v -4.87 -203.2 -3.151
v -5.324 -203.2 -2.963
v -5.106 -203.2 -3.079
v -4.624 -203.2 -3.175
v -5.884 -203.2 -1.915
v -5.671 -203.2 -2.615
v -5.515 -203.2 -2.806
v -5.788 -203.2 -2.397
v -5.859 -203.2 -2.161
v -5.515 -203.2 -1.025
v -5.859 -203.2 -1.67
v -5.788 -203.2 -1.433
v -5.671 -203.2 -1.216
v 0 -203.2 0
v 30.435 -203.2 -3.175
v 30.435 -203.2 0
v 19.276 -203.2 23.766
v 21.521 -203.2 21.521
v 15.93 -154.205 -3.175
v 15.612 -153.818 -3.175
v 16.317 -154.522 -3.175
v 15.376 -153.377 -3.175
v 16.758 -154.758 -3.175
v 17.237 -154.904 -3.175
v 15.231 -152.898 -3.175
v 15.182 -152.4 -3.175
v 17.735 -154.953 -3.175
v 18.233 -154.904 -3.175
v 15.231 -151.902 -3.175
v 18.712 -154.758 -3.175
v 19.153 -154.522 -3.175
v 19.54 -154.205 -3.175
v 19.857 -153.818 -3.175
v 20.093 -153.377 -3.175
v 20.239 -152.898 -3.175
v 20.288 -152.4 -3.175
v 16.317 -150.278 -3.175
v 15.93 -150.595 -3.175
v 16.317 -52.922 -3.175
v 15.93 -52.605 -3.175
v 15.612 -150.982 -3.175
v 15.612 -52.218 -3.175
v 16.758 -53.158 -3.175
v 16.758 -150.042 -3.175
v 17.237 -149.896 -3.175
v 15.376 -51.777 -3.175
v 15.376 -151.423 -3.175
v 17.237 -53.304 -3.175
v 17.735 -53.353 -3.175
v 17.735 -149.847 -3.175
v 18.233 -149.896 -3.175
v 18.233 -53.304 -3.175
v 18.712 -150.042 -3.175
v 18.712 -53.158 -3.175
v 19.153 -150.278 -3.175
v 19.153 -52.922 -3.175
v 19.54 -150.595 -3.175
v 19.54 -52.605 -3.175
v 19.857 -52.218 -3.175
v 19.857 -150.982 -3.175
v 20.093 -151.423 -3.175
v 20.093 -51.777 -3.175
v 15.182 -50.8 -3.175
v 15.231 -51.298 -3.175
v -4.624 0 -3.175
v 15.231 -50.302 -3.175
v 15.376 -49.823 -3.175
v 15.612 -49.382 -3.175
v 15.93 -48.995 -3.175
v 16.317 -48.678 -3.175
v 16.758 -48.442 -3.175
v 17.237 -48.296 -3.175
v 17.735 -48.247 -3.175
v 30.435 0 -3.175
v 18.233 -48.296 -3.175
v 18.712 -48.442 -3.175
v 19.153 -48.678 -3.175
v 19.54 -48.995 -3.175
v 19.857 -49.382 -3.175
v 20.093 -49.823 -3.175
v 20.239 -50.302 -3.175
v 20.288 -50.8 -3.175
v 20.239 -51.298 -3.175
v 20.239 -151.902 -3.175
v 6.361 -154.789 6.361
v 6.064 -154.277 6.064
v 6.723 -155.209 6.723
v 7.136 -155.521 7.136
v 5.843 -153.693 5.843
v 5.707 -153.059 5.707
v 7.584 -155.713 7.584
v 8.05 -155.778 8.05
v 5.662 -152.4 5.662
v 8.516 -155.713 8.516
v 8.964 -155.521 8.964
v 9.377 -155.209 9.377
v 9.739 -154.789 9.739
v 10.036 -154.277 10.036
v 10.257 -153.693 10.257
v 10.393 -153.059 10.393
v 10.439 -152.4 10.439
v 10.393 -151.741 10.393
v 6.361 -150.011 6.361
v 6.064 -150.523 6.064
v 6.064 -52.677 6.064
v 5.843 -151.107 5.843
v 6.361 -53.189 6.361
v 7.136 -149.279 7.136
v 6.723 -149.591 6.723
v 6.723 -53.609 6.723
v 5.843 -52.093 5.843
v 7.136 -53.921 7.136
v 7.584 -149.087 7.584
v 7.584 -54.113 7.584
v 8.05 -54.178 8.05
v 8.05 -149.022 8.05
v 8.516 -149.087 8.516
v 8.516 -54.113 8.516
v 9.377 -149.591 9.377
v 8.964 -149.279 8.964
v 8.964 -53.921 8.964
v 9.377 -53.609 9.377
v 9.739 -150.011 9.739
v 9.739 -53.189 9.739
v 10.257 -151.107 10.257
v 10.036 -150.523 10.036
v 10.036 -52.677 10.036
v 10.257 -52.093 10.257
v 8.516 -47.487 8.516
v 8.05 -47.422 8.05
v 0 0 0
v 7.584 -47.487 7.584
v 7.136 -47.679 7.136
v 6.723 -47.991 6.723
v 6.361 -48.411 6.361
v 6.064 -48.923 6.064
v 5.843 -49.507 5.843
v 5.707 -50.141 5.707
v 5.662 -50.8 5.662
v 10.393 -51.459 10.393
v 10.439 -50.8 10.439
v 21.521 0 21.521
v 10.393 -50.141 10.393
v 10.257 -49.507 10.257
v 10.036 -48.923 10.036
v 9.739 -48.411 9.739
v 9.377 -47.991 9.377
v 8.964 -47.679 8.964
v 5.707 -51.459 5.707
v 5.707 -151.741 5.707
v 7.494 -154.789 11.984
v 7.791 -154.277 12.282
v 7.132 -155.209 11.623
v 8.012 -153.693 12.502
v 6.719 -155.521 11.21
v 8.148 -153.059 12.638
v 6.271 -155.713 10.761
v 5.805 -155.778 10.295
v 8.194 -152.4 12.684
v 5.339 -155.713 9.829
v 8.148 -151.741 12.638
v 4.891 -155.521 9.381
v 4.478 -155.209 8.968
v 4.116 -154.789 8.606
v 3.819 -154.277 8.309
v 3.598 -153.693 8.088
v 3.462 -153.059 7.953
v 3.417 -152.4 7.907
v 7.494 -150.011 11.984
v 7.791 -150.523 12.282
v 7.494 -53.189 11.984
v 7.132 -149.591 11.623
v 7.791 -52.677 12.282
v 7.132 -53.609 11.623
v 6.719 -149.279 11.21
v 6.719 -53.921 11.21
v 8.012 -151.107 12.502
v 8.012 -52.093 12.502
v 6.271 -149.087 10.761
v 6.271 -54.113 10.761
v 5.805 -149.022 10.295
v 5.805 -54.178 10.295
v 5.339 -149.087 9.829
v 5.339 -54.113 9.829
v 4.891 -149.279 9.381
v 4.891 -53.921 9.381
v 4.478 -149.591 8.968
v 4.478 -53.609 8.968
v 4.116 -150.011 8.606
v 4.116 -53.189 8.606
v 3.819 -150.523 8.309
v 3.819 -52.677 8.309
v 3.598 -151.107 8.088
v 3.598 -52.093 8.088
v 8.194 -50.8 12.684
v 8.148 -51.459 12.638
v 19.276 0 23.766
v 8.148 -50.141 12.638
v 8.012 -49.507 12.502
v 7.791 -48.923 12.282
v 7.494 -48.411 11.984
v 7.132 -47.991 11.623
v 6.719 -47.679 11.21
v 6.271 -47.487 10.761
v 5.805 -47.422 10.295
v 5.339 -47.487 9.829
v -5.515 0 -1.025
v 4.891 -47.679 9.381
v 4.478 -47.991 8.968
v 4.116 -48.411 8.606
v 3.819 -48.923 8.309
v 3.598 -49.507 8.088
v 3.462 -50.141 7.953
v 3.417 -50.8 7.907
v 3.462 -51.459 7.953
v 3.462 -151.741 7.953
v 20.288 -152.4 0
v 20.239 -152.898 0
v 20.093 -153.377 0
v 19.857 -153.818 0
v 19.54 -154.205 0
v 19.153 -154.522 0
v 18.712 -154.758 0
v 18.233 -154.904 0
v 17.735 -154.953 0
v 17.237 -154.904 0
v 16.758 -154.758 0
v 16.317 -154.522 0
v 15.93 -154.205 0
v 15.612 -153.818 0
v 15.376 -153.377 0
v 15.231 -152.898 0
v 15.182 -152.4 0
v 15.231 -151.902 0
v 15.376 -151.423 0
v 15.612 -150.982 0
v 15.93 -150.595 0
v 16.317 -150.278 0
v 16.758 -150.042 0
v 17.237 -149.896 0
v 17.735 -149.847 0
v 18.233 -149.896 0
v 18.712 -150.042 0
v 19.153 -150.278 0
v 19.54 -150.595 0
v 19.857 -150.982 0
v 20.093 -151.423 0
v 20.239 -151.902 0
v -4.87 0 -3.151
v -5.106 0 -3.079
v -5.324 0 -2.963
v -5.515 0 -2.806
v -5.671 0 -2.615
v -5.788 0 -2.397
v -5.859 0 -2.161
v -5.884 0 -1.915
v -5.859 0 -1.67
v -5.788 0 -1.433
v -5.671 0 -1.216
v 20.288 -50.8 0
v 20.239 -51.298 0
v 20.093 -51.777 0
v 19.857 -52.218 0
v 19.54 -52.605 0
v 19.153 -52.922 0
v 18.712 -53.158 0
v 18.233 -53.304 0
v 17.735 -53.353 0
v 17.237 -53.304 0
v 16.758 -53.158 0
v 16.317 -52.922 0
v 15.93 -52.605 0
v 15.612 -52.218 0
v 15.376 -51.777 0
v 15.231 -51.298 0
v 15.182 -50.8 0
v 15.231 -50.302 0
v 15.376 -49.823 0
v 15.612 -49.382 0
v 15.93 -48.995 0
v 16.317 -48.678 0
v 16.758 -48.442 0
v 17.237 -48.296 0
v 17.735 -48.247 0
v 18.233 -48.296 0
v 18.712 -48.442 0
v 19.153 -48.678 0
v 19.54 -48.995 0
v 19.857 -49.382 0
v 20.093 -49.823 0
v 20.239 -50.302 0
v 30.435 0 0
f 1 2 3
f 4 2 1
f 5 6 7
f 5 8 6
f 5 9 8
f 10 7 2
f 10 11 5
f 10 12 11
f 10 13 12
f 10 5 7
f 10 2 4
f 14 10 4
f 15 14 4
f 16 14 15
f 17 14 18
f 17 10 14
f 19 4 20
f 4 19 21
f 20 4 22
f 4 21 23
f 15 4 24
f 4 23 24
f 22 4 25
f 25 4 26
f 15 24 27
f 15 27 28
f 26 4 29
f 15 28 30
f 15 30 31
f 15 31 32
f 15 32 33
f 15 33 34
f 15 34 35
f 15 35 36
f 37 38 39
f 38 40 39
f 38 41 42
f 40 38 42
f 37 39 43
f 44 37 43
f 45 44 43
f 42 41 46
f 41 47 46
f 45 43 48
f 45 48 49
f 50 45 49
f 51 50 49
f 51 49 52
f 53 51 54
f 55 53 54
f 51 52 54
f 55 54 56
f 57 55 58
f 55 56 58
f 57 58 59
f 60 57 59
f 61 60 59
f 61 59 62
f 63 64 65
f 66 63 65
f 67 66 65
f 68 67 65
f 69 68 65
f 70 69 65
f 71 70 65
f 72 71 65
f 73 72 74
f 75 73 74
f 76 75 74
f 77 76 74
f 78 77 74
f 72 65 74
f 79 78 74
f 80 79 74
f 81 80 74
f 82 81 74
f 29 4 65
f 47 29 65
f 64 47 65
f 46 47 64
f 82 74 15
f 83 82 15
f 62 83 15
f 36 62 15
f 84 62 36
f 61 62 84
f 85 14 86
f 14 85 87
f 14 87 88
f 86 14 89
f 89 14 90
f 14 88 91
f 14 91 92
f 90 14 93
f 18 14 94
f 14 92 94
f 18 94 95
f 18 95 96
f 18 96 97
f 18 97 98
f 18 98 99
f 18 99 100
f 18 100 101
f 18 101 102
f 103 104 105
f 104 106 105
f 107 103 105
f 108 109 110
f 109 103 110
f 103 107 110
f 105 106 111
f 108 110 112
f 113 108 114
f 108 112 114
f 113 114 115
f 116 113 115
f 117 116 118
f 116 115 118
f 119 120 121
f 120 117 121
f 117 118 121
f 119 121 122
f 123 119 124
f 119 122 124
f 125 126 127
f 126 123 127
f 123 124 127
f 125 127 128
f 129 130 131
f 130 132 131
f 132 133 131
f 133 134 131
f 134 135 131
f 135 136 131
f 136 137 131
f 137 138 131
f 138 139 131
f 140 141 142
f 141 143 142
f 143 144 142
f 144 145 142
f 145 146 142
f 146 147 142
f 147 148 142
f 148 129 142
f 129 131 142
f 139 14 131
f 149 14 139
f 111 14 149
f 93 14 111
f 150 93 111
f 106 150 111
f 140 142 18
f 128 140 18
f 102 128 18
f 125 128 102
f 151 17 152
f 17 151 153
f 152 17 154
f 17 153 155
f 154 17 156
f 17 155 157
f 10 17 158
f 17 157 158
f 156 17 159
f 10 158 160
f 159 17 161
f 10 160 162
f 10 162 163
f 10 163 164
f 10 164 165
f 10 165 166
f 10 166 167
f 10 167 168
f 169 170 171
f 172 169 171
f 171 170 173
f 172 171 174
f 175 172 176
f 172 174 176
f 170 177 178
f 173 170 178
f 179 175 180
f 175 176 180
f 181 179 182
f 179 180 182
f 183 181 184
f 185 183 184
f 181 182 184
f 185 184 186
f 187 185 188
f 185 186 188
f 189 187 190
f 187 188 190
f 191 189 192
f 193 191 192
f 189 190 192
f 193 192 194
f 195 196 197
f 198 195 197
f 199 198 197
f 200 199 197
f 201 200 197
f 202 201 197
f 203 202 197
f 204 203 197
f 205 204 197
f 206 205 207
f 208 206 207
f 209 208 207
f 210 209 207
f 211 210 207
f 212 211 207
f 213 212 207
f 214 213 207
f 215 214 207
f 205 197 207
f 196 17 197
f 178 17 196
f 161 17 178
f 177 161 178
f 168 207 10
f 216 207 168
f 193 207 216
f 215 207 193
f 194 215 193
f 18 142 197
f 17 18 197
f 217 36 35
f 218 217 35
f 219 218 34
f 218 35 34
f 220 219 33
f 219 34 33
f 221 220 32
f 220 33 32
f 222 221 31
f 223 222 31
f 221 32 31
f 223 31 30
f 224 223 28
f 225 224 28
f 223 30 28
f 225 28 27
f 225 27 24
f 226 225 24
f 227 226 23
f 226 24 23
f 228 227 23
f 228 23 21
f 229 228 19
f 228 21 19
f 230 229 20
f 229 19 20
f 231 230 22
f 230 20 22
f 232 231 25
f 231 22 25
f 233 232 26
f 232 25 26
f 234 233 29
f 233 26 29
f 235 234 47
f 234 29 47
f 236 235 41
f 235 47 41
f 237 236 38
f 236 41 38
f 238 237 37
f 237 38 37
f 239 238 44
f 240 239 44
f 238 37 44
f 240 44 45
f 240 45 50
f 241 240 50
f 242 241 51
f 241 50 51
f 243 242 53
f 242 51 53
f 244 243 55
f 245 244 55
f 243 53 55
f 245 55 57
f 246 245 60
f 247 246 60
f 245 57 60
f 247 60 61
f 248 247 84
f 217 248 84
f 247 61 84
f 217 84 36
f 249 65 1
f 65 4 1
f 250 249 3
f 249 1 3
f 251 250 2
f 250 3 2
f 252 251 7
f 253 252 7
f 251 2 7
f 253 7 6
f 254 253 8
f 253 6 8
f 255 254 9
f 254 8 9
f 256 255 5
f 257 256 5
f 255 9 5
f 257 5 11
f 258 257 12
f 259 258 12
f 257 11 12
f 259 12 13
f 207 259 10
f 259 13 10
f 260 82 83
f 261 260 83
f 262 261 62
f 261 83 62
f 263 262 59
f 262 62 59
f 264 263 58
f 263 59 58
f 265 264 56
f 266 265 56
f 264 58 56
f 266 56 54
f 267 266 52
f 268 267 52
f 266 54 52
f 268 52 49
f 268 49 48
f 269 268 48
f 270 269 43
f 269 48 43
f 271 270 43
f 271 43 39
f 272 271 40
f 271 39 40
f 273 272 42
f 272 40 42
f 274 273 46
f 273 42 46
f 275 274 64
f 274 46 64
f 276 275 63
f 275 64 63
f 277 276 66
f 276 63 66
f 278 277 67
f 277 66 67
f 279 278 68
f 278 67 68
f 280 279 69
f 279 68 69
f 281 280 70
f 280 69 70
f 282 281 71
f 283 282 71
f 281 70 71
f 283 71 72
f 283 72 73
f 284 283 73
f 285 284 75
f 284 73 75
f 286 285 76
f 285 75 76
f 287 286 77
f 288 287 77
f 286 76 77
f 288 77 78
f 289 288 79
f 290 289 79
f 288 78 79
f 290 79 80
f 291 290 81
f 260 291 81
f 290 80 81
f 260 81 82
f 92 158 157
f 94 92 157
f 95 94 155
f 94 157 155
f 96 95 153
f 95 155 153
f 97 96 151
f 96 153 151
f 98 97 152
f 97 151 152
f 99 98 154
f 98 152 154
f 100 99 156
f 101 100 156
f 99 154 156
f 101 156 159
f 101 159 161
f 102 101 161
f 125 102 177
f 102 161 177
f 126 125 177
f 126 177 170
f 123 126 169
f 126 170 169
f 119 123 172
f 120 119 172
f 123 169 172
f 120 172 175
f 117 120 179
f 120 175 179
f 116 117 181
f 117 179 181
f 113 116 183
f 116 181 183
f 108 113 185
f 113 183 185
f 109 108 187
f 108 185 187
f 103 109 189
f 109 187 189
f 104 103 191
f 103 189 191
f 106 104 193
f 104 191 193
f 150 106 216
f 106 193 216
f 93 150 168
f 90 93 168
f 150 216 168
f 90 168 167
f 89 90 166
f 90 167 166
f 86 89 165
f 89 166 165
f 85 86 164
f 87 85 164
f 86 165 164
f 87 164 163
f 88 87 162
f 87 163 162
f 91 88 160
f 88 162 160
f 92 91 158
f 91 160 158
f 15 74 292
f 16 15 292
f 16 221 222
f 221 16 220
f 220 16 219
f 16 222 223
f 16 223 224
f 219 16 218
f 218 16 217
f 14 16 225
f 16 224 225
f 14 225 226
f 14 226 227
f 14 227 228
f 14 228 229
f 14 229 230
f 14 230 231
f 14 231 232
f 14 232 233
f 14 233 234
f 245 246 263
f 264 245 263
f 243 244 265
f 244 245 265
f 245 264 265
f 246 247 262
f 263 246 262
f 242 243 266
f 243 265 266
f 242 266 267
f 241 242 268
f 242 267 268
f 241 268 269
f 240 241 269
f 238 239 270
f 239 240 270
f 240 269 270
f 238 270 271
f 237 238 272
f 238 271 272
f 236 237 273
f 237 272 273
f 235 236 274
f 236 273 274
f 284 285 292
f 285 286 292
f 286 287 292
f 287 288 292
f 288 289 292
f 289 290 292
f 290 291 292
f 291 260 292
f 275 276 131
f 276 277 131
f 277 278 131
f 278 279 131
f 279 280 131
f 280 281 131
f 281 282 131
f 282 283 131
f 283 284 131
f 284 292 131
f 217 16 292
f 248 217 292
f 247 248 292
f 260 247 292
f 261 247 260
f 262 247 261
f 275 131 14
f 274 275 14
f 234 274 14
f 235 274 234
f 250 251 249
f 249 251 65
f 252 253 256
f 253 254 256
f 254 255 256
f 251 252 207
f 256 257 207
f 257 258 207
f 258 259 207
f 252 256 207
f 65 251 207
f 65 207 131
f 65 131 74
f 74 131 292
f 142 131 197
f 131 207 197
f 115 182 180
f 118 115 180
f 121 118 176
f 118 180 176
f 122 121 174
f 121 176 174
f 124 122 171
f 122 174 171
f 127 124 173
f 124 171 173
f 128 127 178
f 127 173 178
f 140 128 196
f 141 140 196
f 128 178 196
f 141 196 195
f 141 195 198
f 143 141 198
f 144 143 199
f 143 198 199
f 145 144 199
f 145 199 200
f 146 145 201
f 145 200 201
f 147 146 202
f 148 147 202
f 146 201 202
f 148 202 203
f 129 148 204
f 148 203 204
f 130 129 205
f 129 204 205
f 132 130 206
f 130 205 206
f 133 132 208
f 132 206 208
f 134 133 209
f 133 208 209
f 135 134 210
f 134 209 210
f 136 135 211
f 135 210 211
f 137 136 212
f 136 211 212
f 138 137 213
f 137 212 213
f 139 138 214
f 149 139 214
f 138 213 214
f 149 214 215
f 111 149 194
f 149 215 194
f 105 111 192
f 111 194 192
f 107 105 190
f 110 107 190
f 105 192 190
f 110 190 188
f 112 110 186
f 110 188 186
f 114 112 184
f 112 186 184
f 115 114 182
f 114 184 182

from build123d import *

# Parameters (mm, degrees)
F1_DEPTH = 203.2
F2_R     = 3.3782
F3_DEPTH = 3.175
F4_R     = 2.5527
F5_DEPTH = 3.175
F6_R     = 1.259666


with BuildPart() as f1:
    # F0 (on Front) → F1 (new body)
    with BuildSketch(Plane.XZ):
        Polygon((30.434872, 0), (0, 0), (21.520704, 21.520704), (19.27564, 23.765768), (-7.665128, -3.175), (30.434872, -3.175), align=None)
    extrude(amount=F1_DEPTH)

    # F2 (on face) → F3 (cut, through all)
    with BuildSketch(Plane(origin=(-2.245064, 0, 2.245064), x_dir=(0, -1, 0), z_dir=(-0.707107, 0, 0.707107))):
        with Locations((50.8, 11.384872)):
            Circle(F2_R)
        with Locations((152.4, 11.384872)):
            Circle(F2_R)
    extrude(amount=-F3_DEPTH, mode=Mode.SUBTRACT)

    # F4 (on face) → F5 (cut, through all)
    with BuildSketch(Plane(origin=(0, 0, -3.175), x_dir=(1, 0, 0), z_dir=(0, 0, -1))):
        with Locations((17.734872, 152.4)):
            Circle(F4_R)
        with Locations((17.734872, 50.8)):
            Circle(F4_R)
    extrude(amount=-F5_DEPTH, mode=Mode.SUBTRACT)

    # F6
    f6_edges = [f1.edges().sort_by_distance(p)[0] for p in [
        (-7.665128, -101.6, -3.175),
    ]]
    fillet(f6_edges, radius=F6_R)


solid = f1.part
